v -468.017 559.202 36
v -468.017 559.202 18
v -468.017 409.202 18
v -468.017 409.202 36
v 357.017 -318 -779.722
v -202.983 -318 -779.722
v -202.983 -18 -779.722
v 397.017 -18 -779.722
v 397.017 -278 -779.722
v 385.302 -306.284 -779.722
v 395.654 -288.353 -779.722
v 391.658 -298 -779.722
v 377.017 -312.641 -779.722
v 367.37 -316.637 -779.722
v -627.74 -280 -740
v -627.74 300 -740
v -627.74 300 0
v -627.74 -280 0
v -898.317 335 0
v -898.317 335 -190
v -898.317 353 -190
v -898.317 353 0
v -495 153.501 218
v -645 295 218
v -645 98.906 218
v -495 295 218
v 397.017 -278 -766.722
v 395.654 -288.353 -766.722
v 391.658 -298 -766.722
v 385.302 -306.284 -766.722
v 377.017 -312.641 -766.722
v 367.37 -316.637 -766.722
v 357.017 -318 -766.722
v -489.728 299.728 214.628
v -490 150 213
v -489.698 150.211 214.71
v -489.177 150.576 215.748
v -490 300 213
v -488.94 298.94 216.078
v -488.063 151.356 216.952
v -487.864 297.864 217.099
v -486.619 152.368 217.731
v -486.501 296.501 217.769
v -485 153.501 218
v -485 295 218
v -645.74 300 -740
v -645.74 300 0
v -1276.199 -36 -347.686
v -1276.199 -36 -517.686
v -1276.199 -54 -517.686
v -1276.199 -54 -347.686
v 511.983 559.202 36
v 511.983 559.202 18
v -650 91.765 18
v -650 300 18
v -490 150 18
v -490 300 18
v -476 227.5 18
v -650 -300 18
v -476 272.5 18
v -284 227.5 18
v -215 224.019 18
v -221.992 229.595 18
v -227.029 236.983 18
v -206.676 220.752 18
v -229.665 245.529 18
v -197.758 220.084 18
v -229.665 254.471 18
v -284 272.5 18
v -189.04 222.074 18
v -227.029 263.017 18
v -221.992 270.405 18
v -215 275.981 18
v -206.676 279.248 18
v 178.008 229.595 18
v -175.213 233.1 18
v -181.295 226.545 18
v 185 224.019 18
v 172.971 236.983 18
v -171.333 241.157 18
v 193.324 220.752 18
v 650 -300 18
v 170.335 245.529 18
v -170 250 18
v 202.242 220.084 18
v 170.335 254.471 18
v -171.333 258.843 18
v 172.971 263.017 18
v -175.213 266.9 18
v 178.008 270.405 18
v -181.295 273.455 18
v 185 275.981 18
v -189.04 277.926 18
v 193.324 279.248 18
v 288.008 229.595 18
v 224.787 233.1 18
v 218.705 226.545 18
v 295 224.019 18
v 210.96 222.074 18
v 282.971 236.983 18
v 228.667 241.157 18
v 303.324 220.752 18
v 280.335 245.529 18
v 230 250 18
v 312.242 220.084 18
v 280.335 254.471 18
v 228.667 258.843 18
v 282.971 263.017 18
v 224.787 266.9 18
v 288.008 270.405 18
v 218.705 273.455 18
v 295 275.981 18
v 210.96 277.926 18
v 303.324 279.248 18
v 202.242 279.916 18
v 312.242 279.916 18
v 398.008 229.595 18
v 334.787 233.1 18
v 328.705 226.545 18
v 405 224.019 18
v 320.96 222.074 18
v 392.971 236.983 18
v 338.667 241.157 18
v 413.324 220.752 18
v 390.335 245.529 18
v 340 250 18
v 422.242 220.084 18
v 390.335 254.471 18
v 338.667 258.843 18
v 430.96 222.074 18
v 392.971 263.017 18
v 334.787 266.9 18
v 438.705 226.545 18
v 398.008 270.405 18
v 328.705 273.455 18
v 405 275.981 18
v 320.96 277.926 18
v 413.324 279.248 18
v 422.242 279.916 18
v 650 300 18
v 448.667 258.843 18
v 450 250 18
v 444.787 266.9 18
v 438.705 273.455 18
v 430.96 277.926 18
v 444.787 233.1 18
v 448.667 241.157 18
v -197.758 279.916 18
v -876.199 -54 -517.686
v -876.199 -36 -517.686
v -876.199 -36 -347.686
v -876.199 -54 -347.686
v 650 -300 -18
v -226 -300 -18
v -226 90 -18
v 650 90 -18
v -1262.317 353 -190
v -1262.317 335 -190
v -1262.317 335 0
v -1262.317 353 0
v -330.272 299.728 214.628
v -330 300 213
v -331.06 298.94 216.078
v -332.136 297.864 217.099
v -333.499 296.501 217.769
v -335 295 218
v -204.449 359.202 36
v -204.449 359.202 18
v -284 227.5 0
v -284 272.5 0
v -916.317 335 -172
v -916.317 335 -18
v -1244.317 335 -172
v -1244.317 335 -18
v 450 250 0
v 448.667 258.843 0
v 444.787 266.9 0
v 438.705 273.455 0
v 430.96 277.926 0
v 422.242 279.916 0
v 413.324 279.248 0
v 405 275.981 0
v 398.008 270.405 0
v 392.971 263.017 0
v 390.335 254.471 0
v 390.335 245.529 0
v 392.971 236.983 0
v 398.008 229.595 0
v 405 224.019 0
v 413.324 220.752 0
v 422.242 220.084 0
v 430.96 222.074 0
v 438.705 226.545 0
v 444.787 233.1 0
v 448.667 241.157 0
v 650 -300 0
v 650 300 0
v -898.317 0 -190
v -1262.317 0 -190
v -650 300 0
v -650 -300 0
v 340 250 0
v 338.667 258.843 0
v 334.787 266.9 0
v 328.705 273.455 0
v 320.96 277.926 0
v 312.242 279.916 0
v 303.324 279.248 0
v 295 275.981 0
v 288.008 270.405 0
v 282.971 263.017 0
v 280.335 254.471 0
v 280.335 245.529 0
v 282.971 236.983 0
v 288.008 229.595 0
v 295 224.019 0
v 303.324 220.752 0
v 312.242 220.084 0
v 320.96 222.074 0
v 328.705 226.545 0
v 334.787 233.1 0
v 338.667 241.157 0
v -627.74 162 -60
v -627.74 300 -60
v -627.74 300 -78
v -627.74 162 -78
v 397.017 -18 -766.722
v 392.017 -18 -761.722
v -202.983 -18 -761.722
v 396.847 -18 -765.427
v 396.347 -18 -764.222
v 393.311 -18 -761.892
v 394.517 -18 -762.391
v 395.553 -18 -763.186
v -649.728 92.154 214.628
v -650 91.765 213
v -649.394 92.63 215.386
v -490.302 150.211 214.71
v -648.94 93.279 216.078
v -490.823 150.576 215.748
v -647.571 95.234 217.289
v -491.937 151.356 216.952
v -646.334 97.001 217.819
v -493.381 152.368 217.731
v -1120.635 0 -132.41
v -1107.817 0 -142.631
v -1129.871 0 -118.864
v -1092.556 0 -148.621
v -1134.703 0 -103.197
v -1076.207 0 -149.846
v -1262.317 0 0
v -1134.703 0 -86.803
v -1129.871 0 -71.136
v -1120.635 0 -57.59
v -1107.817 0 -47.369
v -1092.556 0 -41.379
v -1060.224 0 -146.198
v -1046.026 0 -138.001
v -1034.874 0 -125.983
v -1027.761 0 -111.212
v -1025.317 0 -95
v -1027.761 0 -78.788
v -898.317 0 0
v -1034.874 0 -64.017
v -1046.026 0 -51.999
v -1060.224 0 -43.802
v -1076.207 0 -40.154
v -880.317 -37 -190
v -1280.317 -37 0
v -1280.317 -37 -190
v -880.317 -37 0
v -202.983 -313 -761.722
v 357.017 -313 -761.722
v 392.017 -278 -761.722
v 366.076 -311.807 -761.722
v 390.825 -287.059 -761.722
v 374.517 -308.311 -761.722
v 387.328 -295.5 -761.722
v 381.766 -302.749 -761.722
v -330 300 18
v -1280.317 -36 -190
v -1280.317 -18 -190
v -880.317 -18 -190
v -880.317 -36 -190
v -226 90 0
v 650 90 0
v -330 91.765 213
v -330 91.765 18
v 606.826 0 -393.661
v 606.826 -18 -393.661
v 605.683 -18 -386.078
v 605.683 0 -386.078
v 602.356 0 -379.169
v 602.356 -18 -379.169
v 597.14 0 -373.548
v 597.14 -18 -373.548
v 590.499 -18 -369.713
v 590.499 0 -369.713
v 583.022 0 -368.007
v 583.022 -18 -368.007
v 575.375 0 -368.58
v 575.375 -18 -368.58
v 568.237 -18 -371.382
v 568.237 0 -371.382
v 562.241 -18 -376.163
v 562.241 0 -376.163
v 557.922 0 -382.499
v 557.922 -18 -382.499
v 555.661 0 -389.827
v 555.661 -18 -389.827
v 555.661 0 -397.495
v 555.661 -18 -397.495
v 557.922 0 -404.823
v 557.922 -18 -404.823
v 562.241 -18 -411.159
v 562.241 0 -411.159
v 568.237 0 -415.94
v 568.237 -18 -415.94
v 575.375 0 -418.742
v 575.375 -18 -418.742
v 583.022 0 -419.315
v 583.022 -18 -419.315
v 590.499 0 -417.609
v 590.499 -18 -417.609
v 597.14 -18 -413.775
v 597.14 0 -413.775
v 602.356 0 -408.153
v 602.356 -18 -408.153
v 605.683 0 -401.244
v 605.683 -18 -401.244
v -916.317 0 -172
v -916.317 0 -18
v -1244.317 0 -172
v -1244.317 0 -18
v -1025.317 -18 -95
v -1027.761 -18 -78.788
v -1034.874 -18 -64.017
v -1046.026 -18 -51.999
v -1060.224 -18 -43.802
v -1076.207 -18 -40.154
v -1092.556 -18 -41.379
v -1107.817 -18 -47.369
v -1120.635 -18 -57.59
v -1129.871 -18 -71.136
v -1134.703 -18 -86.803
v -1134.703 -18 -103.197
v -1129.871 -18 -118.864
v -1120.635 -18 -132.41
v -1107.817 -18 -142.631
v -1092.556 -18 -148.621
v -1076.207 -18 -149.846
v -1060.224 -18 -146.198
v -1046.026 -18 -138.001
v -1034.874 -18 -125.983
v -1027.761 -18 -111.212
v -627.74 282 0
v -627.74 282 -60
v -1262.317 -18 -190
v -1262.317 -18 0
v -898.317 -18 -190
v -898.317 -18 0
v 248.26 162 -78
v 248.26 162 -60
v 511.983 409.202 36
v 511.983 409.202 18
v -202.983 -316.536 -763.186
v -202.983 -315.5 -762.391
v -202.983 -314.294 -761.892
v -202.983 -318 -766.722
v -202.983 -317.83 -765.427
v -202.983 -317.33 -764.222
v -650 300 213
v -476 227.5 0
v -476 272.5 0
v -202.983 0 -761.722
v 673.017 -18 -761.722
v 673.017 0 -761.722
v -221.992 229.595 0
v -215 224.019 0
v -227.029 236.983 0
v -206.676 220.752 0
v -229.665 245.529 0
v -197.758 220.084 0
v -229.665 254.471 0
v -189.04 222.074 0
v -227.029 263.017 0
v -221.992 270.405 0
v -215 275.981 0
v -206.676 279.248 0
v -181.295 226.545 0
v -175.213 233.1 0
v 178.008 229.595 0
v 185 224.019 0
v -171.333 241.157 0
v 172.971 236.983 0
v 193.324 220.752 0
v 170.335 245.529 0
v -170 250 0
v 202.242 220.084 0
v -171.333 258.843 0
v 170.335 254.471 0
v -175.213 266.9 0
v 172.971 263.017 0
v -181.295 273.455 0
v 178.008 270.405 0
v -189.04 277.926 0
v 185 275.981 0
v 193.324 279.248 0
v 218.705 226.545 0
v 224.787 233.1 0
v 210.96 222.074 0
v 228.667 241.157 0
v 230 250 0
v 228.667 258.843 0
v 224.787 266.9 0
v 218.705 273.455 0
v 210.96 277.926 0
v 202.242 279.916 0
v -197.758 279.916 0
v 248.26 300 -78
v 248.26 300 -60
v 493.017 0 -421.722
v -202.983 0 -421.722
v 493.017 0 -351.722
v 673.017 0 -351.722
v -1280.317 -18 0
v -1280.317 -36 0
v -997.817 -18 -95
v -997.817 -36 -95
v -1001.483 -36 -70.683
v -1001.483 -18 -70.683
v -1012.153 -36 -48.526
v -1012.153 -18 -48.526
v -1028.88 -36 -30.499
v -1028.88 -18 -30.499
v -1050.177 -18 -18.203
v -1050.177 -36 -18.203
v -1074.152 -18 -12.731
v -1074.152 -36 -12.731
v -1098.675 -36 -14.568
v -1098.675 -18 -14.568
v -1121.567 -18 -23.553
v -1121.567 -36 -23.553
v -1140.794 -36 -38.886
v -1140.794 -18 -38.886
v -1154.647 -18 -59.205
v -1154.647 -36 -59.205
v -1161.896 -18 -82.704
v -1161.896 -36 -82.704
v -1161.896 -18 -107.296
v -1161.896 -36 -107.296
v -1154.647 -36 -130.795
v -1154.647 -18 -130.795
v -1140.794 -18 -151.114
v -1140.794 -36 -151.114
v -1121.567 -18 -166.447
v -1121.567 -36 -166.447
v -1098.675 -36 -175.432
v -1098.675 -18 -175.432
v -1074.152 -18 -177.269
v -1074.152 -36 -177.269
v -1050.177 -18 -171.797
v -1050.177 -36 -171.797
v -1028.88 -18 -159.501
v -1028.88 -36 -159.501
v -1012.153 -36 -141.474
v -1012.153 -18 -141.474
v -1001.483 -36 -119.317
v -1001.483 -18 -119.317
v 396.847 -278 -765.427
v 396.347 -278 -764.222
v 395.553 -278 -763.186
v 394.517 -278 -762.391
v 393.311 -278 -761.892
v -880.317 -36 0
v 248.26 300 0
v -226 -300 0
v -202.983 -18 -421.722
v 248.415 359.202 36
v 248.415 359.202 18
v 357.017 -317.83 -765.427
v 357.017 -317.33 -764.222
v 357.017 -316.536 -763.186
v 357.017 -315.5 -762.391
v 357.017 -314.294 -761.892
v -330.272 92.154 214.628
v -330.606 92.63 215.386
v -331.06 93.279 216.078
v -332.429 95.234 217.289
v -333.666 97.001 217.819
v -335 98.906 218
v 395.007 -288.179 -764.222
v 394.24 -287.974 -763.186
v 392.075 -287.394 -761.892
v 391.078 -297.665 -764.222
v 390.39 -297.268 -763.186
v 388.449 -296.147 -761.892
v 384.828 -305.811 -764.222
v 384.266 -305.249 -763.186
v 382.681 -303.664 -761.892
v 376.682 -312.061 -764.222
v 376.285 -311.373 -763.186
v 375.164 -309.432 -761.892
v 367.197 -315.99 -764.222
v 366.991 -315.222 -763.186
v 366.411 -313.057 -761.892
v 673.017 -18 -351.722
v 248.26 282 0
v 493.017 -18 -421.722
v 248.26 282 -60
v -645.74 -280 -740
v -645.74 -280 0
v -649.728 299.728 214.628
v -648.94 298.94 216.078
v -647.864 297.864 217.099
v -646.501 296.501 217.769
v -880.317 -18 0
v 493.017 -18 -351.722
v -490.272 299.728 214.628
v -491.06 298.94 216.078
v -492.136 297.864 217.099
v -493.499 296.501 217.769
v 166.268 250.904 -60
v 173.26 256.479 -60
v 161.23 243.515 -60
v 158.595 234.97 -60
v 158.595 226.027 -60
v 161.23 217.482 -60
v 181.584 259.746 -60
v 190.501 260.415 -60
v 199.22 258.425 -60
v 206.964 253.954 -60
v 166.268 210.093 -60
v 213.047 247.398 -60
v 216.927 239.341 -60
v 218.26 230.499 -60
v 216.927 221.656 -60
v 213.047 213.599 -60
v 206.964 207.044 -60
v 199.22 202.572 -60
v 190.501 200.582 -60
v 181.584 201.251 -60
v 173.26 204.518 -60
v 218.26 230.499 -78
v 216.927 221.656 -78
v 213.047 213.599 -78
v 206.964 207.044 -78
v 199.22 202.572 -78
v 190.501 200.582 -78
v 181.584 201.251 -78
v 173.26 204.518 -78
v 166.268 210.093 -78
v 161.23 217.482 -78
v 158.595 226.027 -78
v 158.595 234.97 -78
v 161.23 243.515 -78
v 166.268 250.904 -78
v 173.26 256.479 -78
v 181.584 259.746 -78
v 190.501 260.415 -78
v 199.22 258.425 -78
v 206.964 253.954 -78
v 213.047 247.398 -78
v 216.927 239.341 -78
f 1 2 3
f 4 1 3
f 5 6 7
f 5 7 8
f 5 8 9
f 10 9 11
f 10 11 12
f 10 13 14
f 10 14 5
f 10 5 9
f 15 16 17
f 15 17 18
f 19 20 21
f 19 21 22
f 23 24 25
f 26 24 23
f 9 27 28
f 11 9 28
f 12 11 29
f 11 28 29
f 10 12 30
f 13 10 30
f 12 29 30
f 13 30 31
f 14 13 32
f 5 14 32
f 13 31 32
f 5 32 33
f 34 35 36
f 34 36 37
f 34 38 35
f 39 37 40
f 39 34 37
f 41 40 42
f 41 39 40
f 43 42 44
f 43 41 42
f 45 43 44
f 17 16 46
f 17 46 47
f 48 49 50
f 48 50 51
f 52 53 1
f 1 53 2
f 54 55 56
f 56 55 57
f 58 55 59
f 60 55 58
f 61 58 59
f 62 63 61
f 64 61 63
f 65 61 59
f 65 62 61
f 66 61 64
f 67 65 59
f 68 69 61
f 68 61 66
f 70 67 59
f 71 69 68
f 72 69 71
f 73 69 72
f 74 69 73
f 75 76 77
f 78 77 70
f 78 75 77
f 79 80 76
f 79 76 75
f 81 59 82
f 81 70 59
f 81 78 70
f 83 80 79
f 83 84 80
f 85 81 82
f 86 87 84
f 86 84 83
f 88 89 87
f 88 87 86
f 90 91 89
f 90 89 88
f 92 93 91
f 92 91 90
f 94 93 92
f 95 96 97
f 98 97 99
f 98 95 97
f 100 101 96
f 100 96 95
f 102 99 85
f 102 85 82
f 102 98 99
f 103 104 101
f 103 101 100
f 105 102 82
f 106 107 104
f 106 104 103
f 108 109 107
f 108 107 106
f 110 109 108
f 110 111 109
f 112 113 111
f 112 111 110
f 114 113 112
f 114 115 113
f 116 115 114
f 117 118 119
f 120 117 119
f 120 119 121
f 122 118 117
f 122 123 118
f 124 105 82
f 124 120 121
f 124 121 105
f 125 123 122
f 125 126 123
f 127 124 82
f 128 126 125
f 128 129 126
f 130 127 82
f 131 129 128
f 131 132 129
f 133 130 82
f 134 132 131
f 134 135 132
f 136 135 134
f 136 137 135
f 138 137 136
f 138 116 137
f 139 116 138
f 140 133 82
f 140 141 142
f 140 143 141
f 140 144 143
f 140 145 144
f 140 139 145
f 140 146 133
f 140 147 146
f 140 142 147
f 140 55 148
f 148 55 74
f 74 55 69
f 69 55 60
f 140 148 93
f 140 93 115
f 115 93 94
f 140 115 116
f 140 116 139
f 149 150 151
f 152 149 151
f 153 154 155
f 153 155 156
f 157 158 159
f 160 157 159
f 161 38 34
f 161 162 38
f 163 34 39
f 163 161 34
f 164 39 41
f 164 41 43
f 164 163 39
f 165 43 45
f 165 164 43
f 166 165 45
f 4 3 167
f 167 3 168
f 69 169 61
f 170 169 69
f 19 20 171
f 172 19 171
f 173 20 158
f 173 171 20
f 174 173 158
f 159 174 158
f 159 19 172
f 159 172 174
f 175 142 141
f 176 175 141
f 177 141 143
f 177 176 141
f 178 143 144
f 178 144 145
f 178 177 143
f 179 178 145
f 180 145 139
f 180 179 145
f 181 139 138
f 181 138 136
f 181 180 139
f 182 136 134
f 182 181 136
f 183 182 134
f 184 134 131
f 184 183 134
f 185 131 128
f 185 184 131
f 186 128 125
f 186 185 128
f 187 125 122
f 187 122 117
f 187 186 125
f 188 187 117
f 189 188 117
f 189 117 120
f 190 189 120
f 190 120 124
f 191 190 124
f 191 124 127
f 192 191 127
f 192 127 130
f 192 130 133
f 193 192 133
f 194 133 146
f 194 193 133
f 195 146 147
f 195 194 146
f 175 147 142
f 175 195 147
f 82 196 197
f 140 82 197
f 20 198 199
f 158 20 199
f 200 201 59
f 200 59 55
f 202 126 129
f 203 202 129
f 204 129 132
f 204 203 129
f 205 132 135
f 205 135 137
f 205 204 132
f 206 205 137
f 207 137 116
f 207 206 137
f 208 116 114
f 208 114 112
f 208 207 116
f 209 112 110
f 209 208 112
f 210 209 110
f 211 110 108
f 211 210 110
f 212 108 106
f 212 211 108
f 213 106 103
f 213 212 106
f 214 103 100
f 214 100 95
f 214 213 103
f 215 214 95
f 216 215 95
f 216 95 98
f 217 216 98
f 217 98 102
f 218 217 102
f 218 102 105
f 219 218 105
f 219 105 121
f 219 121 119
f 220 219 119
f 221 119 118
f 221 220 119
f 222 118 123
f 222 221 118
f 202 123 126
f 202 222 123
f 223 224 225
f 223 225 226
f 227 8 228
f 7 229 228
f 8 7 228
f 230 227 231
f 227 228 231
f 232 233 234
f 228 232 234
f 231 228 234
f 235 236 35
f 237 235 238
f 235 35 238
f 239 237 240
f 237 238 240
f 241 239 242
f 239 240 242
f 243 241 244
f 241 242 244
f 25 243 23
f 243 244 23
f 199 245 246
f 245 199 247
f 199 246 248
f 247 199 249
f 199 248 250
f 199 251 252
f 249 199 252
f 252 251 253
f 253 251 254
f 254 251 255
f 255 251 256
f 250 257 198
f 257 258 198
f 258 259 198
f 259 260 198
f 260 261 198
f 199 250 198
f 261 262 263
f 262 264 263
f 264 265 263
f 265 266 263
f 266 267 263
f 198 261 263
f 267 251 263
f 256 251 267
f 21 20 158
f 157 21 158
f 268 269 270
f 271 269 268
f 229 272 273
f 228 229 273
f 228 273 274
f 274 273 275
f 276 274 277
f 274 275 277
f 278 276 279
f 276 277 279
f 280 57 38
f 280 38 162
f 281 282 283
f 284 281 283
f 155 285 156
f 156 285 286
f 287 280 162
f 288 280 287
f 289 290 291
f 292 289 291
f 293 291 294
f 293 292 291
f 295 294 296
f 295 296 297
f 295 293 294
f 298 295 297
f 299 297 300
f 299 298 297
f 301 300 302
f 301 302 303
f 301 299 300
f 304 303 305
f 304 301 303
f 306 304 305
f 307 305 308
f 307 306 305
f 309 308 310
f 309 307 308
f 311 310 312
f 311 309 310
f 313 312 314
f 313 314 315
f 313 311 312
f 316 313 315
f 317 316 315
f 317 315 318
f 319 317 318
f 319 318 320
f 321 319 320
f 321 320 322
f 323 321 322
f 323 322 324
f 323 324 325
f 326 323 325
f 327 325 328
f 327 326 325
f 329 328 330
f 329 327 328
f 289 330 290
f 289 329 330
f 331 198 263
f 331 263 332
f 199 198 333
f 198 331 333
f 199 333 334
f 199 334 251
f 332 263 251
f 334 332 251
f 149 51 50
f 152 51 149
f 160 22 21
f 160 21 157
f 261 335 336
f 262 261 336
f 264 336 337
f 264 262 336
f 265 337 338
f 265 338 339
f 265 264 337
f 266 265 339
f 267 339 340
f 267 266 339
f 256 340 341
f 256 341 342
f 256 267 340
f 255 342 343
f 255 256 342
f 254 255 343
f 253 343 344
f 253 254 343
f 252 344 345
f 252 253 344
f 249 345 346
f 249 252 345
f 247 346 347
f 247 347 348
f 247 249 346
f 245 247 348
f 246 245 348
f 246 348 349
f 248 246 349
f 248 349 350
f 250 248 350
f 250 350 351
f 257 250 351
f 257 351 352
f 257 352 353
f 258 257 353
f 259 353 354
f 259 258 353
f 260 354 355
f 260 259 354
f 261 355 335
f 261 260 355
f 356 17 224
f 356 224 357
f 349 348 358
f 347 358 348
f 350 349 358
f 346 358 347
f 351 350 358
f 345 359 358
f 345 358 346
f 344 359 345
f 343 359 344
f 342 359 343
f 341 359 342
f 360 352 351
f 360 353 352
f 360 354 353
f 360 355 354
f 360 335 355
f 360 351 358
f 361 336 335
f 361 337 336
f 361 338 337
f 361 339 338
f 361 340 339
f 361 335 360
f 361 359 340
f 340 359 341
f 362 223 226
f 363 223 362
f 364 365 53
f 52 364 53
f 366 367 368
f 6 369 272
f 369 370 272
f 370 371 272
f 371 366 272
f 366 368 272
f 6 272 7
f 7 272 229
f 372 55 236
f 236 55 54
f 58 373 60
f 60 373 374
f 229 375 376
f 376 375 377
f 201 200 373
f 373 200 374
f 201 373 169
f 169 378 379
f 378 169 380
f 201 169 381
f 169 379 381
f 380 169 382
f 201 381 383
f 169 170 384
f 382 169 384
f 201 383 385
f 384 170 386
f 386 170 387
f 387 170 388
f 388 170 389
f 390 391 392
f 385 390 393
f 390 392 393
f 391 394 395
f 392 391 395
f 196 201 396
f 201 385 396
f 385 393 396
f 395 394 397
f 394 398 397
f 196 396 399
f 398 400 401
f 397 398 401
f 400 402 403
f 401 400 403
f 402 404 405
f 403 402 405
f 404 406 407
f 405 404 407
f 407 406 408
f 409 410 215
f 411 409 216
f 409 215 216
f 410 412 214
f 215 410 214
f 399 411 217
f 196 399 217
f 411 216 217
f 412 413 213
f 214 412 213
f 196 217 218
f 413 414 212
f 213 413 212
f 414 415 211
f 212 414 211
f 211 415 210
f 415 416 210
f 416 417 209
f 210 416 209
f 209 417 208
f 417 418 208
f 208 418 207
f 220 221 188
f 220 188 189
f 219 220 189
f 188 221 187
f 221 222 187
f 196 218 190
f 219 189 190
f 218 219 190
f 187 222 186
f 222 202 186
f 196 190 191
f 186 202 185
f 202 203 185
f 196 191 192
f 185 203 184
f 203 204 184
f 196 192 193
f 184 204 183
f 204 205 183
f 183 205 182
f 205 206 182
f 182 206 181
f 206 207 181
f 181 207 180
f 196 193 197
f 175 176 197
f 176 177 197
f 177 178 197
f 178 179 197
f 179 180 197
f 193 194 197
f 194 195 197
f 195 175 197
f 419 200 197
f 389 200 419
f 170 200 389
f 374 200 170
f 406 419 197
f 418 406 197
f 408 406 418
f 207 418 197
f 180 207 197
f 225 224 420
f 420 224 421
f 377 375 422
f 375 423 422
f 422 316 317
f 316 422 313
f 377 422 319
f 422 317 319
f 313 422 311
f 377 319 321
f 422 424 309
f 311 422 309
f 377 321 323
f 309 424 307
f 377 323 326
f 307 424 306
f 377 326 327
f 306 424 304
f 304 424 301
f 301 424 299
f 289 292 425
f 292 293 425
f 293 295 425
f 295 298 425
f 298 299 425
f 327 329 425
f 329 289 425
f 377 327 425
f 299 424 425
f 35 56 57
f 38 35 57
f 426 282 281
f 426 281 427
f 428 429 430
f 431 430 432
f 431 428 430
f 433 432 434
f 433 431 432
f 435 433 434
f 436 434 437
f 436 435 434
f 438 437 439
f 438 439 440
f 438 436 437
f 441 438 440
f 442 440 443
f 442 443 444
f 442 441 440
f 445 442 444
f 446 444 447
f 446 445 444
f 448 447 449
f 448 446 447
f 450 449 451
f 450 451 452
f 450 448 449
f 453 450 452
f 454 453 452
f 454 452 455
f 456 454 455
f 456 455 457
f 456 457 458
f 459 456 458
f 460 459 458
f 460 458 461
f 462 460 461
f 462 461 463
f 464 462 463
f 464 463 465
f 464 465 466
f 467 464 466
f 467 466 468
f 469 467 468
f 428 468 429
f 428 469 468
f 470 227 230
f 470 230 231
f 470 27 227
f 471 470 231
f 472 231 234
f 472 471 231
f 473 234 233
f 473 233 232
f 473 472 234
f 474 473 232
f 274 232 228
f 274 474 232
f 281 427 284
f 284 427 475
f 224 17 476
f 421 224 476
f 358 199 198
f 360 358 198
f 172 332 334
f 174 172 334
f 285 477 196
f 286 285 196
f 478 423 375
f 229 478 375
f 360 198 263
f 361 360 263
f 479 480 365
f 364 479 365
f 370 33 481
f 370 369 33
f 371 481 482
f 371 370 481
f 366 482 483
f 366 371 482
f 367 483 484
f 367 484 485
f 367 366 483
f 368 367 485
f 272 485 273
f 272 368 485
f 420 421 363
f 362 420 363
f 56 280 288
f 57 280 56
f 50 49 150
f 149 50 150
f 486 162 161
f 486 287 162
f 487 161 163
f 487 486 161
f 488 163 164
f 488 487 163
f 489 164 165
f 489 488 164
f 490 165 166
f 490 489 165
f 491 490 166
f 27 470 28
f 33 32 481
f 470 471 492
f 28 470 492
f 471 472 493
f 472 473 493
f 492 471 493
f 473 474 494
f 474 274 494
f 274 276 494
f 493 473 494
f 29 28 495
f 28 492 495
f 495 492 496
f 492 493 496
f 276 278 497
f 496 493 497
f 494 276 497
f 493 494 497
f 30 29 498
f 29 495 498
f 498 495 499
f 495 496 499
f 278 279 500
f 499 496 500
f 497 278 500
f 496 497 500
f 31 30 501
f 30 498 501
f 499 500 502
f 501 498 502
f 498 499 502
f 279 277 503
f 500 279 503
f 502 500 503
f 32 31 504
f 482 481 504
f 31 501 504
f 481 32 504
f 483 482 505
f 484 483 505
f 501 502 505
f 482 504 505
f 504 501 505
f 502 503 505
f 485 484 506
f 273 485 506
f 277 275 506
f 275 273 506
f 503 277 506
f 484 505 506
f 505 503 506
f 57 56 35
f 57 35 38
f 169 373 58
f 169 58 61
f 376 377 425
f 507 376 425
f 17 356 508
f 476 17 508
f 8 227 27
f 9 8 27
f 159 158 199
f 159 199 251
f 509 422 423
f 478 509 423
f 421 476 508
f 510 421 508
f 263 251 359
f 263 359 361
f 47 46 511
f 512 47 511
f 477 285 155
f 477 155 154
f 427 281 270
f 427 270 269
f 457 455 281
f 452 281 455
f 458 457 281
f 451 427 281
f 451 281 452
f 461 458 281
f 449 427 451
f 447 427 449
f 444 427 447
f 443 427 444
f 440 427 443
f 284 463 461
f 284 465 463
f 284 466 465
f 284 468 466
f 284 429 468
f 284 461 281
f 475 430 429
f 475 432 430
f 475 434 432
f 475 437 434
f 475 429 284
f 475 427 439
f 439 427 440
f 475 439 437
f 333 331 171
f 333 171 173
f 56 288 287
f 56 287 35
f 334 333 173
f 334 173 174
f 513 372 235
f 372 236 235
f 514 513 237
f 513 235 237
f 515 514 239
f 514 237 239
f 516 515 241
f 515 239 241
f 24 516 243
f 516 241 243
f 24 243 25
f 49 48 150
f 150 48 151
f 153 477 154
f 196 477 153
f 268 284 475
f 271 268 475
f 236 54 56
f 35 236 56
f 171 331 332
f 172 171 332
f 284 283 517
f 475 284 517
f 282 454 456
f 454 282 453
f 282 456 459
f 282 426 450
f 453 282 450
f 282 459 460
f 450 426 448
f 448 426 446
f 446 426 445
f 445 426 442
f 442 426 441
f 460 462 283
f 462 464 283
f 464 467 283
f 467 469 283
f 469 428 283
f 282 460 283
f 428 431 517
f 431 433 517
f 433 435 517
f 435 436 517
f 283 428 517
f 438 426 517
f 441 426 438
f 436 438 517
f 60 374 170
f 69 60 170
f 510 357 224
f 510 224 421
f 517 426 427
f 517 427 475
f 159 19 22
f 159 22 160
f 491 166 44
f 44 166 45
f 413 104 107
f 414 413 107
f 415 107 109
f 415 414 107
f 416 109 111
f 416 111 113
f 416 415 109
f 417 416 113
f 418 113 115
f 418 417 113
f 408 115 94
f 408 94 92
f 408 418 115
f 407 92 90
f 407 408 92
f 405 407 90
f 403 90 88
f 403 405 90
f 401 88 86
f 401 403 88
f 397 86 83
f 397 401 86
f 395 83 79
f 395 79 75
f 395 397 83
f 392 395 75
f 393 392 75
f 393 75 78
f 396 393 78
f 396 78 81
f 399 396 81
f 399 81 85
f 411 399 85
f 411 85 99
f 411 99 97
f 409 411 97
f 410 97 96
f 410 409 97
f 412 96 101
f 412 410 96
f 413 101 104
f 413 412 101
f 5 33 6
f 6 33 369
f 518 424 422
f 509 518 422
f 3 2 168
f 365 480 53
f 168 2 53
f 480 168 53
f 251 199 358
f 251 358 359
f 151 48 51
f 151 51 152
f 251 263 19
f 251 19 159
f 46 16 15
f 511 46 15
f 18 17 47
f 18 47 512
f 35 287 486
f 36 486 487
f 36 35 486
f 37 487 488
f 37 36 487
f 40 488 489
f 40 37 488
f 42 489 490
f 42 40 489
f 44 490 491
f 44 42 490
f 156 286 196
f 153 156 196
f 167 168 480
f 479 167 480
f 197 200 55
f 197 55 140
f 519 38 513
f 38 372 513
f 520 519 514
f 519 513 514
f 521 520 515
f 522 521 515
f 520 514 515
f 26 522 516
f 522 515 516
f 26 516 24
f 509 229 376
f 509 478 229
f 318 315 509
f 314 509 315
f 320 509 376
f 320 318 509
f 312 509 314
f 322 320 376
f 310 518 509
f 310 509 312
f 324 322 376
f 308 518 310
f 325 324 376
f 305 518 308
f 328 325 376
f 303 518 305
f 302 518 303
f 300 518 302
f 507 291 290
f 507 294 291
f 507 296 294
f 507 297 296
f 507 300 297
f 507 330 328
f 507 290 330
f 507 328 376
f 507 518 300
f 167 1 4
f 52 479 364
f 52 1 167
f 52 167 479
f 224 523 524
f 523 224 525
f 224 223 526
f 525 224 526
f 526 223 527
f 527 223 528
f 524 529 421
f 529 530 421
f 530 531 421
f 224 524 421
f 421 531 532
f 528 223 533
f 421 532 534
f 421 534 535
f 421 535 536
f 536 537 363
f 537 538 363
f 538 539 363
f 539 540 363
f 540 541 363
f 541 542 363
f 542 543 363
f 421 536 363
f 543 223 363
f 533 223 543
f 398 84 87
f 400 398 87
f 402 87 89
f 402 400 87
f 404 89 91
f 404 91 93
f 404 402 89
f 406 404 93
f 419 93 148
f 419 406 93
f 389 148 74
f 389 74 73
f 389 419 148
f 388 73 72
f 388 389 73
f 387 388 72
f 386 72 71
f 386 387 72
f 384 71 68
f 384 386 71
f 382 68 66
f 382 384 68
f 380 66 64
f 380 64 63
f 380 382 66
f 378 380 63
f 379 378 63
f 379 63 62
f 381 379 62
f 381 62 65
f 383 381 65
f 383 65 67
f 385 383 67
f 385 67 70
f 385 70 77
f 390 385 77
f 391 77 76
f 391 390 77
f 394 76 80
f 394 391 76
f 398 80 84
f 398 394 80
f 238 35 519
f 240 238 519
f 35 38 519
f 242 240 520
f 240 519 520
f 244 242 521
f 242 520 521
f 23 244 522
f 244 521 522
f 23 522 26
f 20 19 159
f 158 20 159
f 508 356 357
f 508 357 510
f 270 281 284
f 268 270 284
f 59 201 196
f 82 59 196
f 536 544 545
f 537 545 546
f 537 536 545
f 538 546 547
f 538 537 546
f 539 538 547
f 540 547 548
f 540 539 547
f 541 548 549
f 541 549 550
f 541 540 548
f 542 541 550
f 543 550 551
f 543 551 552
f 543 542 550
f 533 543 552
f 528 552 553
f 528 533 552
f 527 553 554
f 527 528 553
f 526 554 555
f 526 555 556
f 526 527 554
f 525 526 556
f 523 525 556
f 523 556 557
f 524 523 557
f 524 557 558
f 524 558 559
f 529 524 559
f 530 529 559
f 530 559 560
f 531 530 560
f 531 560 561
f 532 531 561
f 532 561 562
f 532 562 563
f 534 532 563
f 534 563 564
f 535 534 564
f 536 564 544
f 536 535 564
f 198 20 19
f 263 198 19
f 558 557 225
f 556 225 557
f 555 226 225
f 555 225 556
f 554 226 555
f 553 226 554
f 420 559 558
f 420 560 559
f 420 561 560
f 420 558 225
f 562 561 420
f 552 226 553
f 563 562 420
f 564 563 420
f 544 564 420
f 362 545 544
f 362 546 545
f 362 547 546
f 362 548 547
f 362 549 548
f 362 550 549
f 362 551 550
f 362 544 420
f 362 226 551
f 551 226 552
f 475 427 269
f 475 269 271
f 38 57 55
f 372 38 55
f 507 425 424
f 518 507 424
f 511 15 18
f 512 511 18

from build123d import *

# Parameters (mm, degrees)
F0_W      = 1300
F0_H      = 600
F0_W_2    = 192
F0_H_2    = 45
F0_R      = 30
F1_DEPTH  = 18
F2_W      = 876
F2_H      = 18
F3_DEPTH  = 60
F4_W      = 876
F4_H      = 138
F4_R      = 30
F5_DEPTH  = 18
F6_W      = 580
F6_H      = 740
F7_DEPTH  = 18
F9_DEPTH  = 200
F10_W     = 364
F10_H     = 190
F10_R     = 55
F11_DEPTH = 18
F12_W     = 364
F12_H     = 190
F12_W_2   = 328
F12_H_2   = 154
F13_DEPTH = 335
F14_W     = 400
F14_H     = 190
F14_R     = 82.5
F15_DEPTH = 18
F16_W     = 364
F16_H     = 190
F17_DEPTH = 18
F18_W     = 876
F18_H     = 390
F19_DEPTH = 18
F20_R     = 25.726034
F21_DEPTH = 18
F23_DEPTH = 18
F24_R     = 5
F25_W     = 400
F25_H     = 170
F26_DEPTH = 18
F27_W     = 400
F27_H     = 190
F28_DEPTH = 1
F30_DEPTH = 18
F31_R     = 5


with BuildPart() as f1:
    # F0 (on Top) → F1 (new body)
    with BuildSketch(Plane.XY):
        Rectangle(F0_W, F0_H)
        with Locations((-380, 250)):
            Rectangle(F0_W_2, F0_H_2, mode=Mode.SUBTRACT)
        with Locations((-200, 250)):
            Circle(F0_R, mode=Mode.SUBTRACT)
        with Locations((200, 250)):
            Circle(F0_R, mode=Mode.SUBTRACT)
        with Locations((310, 250)):
            Circle(F0_R, mode=Mode.SUBTRACT)
        with Locations((420, 250)):
            Circle(F0_R, mode=Mode.SUBTRACT)
    extrude(amount=F1_DEPTH)


with BuildPart() as f3:
    # F2 (on face) → F3 (new body)
    with BuildSketch(Plane(origin=(0, 0, 0), x_dir=(1, 0, 0), z_dir=(0, 0, -1))):
        with Locations((-189.740443, -291)):
            Rectangle(F2_W, F2_H)
    extrude(amount=F3_DEPTH)


with BuildPart() as f5:
    # F4 (on face) → F5 (new body)
    with BuildSketch(Plane(origin=(0, 0, -60), x_dir=(1, 0, 0), z_dir=(0, 0, -1))):
        with Locations((-189.740443, -231)):
            Rectangle(F4_W, F4_H)
        with Locations((188.259557, -230.498597)):
            Circle(F4_R, mode=Mode.SUBTRACT)
    extrude(amount=F5_DEPTH)


with BuildPart() as f7:
    # F6 (on face) → F7 (new body)
    with BuildSketch(Plane(origin=(-627.740443, 0, 0), x_dir=(0, -1, 0), z_dir=(-1, 0, 0))):
        with Locations((-10, -370)):
            Rectangle(F6_W, F6_H)
    extrude(amount=F7_DEPTH)


with BuildPart() as f9:
    # F8 (on face) → F9 (new body)
    with BuildSketch(Plane.XY.offset(18)):
        Polygon((-490, 300), (-650, 300), (-650, 91.764763), (-490, 150), align=None)
    extrude(amount=F9_DEPTH)

    # F31
    f31_edges = [f9.edges().sort_by_distance(p)[0] for p in [
        (-650, 195.882381, 218),
        (-570, 120.882381, 218),
        (-490, 225, 218),
        (-570, 300, 218),
    ]]
    fillet(f31_edges, radius=F31_R)


with BuildPart() as f11:
    # F10 (on Front) → F11 (new body)
    with BuildSketch(Plane.XZ):
        with Locations((-1080.317497, -95)):
            Rectangle(F10_W, F10_H)
        with Locations((-1080.317497, -95)):
            Circle(F10_R, mode=Mode.SUBTRACT)
    extrude(amount=F11_DEPTH)


with BuildPart() as f13:
    # F12 (on face) → F13 (new body)
    with BuildSketch(Plane(origin=(0, 0, 0), x_dir=(-1, 0, 0), z_dir=(0, 1, 0))):
        with Locations((1080.317497, -95)):
            Rectangle(F12_W, F12_H)
        with Locations((1080.317497, -95)):
            Rectangle(F12_W_2, F12_H_2, mode=Mode.SUBTRACT)
    extrude(amount=F13_DEPTH)


with BuildPart() as f15:
    # F14 (on face) → F15 (new body)
    with BuildSketch(Plane.XZ.offset(18)):
        with Locations((-1080.317497, -95)):
            Rectangle(F14_W, F14_H)
        with Locations((-1080.317497, -95)):
            Circle(F14_R, mode=Mode.SUBTRACT)
    extrude(amount=F15_DEPTH)


with BuildPart() as f17:
    # F16 (on face) → F17 (new body)
    with BuildSketch(Plane(origin=(0, 335, 0), x_dir=(-1, 0, 0), z_dir=(0, 1, 0))):
        with Locations((1080.317497, -95)):
            Rectangle(F16_W, F16_H)
    extrude(amount=F17_DEPTH)


with BuildPart() as f19:
    # F18 (on face) → F19 (new body)
    with BuildSketch(Plane(origin=(0, 0, 0), x_dir=(1, 0, 0), z_dir=(0, 0, -1))):
        with Locations((212, 105)):
            Rectangle(F18_W, F18_H)
    extrude(amount=F19_DEPTH)


with BuildPart() as f21:
    # F20 (on Front) → F21 (new body)
    with BuildSketch(Plane.XZ):
        Polygon((-202.982641, -761.721503), (673.017359, -761.721503), (673.017359, -351.721503), (493.017359, -351.721503), (493.017359, -421.721503), (-202.982641, -421.721503), align=None)
        with Locations((581.099927, -393.661082)):
            Circle(F20_R, mode=Mode.SUBTRACT)
    extrude(amount=F21_DEPTH)


with BuildPart() as f23:
    # F22 (on face) → F23 (new body)
    with BuildSketch(Plane(origin=(0, 0, -761.721503), x_dir=(1, 0, 0), z_dir=(0, 0, -1))):
        with BuildLine():
            Line((-202.982641, 318), (-202.982641, 18))
            Line((-202.982641, 18), (397.017359, 18))
            Line((397.017359, 18), (397.017359, 278))
            ThreePointArc((397.017359, 278), (385.301631, 306.284271), (357.017359, 318))
            Line((357.017359, 318), (-202.982641, 318))
        make_face()
    extrude(amount=F23_DEPTH)

    # F24
    f24_edges = [f23.edges().sort_by_distance(p)[0] for p in [
        (77.017359, -318, -761.721503),
        (385.301631, -306.284271, -761.721503),
        (397.017359, -148, -761.721503),
    ]]
    fillet(f24_edges, radius=F24_R)


with BuildPart() as f26:
    # F25 (on face) → F26 (new body)
    with BuildSketch(Plane.XZ.offset(36)):
        with Locations((-1076.199204, -432.686272)):
            Rectangle(F25_W, F25_H)
    extrude(amount=F26_DEPTH)


with BuildPart() as f28:
    # F27 (on face) → F28 (new body)
    with BuildSketch(Plane.XZ.offset(36)):
        with Locations((-1080.317497, -95)):
            Rectangle(F27_W, F27_H)
    extrude(amount=F28_DEPTH)


with BuildPart() as f30:
    # F29 (on face) → F30 (new body)
    with BuildSketch(Plane.XY.offset(18)):
        Polygon((511.982864, 559.202158), (-468.017136, 559.202158), (-468.017136, 409.202158), (-204.449177, 359.202158), (248.414904, 359.202158), (511.982864, 409.202158), align=None)
    extrude(amount=F30_DEPTH)


with BuildPart() as f32_1:
    # F32: instance of F9
    add(f9.part.mirror(Plane(origin=(-490, 225, 115.5), x_dir=(0, 1, 0), z_dir=(1, 0, 0))))


solid = Compound([f1.part, f3.part, f5.part, f7.part, f9.part, f11.part, f13.part, f15.part, f17.part, f19.part, f21.part, f23.part, f26.part, f28.part, f30.part, f32_1.part])
